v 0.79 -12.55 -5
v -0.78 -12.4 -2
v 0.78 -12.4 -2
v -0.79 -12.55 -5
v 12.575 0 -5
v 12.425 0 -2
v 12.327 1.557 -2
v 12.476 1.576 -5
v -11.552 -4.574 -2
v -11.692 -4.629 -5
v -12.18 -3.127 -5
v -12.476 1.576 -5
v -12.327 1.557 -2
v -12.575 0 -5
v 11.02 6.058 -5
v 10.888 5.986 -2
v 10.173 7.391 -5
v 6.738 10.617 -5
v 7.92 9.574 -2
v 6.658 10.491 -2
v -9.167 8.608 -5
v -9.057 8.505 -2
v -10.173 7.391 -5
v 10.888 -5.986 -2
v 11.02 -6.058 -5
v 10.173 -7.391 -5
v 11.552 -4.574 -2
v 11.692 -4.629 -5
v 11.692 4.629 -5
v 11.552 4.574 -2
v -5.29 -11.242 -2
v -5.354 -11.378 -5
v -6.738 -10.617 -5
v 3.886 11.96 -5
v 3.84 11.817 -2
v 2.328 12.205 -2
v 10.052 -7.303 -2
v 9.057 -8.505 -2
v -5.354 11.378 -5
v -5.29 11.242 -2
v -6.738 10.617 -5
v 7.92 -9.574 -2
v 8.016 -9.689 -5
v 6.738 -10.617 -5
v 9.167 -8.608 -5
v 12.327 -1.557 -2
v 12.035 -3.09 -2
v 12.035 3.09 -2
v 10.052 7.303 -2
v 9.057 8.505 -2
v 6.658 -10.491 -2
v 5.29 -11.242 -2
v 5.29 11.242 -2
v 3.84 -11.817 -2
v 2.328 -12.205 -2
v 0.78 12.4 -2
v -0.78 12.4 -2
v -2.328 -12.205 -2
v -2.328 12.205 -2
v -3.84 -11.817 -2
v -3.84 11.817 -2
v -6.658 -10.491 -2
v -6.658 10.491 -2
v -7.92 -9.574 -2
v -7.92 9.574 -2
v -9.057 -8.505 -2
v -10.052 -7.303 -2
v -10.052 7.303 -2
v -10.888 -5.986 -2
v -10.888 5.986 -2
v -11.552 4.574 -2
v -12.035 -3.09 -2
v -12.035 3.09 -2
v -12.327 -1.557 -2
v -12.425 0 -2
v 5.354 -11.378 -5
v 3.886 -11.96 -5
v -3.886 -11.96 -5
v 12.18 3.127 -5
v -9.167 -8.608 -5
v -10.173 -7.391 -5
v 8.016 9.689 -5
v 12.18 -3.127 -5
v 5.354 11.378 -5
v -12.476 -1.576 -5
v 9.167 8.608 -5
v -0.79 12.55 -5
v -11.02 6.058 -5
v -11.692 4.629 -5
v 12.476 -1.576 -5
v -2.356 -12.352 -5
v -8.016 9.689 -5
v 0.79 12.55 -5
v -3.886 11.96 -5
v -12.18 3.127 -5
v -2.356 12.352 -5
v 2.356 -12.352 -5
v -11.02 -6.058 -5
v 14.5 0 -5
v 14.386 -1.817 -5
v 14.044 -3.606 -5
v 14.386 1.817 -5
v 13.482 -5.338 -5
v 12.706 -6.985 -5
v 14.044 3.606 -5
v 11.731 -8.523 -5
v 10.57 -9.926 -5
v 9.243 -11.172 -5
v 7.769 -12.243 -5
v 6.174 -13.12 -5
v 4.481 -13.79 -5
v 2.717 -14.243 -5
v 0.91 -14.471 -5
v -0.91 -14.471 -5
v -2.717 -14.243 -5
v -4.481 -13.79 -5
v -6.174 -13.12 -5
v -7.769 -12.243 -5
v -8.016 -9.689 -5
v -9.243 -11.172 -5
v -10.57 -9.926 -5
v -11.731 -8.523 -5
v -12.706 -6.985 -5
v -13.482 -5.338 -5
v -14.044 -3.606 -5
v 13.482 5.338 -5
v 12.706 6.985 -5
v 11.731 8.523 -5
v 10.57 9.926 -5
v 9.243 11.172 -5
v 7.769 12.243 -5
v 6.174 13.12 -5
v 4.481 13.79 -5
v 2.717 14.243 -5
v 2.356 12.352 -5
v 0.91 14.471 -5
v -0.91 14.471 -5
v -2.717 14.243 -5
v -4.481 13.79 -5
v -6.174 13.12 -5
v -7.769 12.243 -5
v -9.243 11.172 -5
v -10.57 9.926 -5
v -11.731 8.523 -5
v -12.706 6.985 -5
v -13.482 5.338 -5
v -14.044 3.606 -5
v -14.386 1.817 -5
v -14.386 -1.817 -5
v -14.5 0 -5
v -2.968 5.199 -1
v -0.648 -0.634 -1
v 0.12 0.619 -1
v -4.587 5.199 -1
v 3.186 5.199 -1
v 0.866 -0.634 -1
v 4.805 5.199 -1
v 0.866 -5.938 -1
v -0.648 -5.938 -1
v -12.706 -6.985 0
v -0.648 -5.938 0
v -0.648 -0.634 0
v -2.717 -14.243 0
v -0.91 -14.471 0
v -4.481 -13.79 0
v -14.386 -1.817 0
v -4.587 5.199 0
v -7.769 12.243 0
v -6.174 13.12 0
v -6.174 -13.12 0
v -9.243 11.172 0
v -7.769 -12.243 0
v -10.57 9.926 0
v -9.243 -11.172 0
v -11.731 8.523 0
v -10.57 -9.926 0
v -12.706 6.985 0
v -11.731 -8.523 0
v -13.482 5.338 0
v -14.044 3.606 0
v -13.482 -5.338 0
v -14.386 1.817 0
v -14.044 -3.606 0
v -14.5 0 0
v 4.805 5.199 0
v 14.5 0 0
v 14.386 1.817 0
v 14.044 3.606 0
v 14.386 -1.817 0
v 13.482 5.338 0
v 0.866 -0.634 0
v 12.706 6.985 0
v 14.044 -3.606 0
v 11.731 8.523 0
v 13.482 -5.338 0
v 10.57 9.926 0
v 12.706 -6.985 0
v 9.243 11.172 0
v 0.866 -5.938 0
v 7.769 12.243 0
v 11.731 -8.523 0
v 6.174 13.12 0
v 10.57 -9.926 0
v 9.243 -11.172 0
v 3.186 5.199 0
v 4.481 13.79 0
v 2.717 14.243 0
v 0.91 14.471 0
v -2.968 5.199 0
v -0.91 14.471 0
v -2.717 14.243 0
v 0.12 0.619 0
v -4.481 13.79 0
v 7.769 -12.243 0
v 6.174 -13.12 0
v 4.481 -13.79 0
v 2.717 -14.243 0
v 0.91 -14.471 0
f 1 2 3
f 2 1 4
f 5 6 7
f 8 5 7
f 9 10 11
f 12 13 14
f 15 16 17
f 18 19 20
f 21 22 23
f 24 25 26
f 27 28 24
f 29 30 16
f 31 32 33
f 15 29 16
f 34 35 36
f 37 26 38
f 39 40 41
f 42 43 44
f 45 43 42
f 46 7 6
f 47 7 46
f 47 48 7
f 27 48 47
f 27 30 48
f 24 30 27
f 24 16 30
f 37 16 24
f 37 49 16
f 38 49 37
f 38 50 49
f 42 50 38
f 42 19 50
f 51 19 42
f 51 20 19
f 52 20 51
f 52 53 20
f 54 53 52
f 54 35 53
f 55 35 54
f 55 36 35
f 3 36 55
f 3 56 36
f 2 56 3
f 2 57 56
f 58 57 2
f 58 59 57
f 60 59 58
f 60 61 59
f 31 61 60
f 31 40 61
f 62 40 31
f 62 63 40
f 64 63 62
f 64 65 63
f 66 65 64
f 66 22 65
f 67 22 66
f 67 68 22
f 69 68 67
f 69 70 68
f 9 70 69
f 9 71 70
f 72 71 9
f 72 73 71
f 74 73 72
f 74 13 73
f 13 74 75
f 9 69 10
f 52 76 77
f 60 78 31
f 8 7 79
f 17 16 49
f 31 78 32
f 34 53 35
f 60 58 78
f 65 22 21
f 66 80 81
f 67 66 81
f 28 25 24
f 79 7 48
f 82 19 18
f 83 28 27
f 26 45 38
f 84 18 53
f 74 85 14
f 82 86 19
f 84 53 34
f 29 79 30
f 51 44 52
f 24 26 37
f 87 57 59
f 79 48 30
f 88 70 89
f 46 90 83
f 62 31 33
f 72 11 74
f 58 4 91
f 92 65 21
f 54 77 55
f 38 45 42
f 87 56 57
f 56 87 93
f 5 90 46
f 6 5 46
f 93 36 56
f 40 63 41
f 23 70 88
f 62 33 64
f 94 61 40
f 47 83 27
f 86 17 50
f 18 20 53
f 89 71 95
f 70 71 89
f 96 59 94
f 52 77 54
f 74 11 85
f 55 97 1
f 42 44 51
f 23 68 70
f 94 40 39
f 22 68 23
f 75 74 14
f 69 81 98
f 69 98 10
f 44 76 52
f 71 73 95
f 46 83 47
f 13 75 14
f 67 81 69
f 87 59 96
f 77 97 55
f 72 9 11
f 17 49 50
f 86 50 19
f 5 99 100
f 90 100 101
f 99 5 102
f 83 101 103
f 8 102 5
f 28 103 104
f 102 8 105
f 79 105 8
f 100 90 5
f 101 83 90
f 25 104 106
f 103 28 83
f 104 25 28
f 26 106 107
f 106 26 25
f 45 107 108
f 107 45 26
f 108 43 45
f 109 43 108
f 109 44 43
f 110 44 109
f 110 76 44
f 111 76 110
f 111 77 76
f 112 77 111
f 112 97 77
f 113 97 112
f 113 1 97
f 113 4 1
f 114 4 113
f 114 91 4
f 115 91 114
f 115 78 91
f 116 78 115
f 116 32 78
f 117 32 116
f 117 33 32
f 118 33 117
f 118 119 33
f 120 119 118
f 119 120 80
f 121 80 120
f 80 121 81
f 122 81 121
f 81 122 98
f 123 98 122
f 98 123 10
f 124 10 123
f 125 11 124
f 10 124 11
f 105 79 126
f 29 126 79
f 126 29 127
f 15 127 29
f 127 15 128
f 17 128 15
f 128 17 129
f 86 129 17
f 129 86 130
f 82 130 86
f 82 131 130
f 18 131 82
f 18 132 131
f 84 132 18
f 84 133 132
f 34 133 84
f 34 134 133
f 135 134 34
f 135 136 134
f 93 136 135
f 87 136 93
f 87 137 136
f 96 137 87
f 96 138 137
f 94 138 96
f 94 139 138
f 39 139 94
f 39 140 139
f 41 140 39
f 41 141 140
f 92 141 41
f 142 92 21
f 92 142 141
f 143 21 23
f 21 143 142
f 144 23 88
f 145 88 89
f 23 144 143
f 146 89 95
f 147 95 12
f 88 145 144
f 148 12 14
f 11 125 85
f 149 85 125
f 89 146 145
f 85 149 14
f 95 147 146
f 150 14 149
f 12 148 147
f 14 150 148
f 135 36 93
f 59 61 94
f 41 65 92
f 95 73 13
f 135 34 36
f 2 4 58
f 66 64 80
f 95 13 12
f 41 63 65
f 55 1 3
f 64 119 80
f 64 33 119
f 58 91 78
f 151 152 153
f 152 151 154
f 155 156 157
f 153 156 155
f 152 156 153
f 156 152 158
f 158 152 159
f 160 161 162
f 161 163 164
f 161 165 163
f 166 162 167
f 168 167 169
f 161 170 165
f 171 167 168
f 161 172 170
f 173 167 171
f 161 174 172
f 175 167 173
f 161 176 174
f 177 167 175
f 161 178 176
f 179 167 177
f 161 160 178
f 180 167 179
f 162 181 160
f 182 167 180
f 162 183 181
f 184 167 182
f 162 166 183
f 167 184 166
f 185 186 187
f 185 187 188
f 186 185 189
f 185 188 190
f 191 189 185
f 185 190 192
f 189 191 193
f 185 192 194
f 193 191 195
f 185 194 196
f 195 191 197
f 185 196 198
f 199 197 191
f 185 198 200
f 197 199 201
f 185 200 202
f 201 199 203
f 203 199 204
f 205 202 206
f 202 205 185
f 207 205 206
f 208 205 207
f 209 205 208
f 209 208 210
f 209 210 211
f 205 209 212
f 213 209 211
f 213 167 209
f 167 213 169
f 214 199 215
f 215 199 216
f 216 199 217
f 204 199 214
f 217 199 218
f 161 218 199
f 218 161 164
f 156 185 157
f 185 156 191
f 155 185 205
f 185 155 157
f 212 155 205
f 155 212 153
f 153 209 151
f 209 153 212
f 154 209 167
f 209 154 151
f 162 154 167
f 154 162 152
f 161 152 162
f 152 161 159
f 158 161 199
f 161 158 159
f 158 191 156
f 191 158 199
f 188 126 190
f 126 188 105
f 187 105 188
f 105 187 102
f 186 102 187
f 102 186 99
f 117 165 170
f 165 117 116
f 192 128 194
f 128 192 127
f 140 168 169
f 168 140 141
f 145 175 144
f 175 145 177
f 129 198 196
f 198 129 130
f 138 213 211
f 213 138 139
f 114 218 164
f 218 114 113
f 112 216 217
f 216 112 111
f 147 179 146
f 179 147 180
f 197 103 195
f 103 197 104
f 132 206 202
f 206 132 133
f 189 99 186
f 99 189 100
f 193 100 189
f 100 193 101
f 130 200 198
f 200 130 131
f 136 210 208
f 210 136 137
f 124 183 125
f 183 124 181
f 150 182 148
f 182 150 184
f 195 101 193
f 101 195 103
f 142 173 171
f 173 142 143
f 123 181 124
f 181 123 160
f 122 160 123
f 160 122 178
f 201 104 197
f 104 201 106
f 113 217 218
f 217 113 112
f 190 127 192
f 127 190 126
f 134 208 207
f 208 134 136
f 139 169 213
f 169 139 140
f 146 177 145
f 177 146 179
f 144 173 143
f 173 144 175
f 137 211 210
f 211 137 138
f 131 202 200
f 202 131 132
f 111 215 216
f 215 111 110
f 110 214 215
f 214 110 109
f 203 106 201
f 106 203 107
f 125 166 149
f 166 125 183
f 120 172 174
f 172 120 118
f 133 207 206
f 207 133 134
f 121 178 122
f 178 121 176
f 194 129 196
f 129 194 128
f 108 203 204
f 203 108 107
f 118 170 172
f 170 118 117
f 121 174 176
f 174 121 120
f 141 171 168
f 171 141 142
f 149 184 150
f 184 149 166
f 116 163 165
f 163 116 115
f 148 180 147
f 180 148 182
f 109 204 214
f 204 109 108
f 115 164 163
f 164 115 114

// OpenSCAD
$fn = 50;

difference() {
	union() {
		translate(v = [0, 0, -5.0]) {
			cylinder(h = 5, r = 14.5);
		}
	}
	union() {
		#translate(v = [0, 0, -5.0]) {
			cylinder(h = 3, r1 = 12.575, r2 = 12.425);
		}
		translate(v = [0, -0.5, -1]) {
			linear_extrude(height = 1) {
				text(font = "Webdings", halign = "center", size = 11, text = "Y", valign = "center");
			}
		}
	}
}
